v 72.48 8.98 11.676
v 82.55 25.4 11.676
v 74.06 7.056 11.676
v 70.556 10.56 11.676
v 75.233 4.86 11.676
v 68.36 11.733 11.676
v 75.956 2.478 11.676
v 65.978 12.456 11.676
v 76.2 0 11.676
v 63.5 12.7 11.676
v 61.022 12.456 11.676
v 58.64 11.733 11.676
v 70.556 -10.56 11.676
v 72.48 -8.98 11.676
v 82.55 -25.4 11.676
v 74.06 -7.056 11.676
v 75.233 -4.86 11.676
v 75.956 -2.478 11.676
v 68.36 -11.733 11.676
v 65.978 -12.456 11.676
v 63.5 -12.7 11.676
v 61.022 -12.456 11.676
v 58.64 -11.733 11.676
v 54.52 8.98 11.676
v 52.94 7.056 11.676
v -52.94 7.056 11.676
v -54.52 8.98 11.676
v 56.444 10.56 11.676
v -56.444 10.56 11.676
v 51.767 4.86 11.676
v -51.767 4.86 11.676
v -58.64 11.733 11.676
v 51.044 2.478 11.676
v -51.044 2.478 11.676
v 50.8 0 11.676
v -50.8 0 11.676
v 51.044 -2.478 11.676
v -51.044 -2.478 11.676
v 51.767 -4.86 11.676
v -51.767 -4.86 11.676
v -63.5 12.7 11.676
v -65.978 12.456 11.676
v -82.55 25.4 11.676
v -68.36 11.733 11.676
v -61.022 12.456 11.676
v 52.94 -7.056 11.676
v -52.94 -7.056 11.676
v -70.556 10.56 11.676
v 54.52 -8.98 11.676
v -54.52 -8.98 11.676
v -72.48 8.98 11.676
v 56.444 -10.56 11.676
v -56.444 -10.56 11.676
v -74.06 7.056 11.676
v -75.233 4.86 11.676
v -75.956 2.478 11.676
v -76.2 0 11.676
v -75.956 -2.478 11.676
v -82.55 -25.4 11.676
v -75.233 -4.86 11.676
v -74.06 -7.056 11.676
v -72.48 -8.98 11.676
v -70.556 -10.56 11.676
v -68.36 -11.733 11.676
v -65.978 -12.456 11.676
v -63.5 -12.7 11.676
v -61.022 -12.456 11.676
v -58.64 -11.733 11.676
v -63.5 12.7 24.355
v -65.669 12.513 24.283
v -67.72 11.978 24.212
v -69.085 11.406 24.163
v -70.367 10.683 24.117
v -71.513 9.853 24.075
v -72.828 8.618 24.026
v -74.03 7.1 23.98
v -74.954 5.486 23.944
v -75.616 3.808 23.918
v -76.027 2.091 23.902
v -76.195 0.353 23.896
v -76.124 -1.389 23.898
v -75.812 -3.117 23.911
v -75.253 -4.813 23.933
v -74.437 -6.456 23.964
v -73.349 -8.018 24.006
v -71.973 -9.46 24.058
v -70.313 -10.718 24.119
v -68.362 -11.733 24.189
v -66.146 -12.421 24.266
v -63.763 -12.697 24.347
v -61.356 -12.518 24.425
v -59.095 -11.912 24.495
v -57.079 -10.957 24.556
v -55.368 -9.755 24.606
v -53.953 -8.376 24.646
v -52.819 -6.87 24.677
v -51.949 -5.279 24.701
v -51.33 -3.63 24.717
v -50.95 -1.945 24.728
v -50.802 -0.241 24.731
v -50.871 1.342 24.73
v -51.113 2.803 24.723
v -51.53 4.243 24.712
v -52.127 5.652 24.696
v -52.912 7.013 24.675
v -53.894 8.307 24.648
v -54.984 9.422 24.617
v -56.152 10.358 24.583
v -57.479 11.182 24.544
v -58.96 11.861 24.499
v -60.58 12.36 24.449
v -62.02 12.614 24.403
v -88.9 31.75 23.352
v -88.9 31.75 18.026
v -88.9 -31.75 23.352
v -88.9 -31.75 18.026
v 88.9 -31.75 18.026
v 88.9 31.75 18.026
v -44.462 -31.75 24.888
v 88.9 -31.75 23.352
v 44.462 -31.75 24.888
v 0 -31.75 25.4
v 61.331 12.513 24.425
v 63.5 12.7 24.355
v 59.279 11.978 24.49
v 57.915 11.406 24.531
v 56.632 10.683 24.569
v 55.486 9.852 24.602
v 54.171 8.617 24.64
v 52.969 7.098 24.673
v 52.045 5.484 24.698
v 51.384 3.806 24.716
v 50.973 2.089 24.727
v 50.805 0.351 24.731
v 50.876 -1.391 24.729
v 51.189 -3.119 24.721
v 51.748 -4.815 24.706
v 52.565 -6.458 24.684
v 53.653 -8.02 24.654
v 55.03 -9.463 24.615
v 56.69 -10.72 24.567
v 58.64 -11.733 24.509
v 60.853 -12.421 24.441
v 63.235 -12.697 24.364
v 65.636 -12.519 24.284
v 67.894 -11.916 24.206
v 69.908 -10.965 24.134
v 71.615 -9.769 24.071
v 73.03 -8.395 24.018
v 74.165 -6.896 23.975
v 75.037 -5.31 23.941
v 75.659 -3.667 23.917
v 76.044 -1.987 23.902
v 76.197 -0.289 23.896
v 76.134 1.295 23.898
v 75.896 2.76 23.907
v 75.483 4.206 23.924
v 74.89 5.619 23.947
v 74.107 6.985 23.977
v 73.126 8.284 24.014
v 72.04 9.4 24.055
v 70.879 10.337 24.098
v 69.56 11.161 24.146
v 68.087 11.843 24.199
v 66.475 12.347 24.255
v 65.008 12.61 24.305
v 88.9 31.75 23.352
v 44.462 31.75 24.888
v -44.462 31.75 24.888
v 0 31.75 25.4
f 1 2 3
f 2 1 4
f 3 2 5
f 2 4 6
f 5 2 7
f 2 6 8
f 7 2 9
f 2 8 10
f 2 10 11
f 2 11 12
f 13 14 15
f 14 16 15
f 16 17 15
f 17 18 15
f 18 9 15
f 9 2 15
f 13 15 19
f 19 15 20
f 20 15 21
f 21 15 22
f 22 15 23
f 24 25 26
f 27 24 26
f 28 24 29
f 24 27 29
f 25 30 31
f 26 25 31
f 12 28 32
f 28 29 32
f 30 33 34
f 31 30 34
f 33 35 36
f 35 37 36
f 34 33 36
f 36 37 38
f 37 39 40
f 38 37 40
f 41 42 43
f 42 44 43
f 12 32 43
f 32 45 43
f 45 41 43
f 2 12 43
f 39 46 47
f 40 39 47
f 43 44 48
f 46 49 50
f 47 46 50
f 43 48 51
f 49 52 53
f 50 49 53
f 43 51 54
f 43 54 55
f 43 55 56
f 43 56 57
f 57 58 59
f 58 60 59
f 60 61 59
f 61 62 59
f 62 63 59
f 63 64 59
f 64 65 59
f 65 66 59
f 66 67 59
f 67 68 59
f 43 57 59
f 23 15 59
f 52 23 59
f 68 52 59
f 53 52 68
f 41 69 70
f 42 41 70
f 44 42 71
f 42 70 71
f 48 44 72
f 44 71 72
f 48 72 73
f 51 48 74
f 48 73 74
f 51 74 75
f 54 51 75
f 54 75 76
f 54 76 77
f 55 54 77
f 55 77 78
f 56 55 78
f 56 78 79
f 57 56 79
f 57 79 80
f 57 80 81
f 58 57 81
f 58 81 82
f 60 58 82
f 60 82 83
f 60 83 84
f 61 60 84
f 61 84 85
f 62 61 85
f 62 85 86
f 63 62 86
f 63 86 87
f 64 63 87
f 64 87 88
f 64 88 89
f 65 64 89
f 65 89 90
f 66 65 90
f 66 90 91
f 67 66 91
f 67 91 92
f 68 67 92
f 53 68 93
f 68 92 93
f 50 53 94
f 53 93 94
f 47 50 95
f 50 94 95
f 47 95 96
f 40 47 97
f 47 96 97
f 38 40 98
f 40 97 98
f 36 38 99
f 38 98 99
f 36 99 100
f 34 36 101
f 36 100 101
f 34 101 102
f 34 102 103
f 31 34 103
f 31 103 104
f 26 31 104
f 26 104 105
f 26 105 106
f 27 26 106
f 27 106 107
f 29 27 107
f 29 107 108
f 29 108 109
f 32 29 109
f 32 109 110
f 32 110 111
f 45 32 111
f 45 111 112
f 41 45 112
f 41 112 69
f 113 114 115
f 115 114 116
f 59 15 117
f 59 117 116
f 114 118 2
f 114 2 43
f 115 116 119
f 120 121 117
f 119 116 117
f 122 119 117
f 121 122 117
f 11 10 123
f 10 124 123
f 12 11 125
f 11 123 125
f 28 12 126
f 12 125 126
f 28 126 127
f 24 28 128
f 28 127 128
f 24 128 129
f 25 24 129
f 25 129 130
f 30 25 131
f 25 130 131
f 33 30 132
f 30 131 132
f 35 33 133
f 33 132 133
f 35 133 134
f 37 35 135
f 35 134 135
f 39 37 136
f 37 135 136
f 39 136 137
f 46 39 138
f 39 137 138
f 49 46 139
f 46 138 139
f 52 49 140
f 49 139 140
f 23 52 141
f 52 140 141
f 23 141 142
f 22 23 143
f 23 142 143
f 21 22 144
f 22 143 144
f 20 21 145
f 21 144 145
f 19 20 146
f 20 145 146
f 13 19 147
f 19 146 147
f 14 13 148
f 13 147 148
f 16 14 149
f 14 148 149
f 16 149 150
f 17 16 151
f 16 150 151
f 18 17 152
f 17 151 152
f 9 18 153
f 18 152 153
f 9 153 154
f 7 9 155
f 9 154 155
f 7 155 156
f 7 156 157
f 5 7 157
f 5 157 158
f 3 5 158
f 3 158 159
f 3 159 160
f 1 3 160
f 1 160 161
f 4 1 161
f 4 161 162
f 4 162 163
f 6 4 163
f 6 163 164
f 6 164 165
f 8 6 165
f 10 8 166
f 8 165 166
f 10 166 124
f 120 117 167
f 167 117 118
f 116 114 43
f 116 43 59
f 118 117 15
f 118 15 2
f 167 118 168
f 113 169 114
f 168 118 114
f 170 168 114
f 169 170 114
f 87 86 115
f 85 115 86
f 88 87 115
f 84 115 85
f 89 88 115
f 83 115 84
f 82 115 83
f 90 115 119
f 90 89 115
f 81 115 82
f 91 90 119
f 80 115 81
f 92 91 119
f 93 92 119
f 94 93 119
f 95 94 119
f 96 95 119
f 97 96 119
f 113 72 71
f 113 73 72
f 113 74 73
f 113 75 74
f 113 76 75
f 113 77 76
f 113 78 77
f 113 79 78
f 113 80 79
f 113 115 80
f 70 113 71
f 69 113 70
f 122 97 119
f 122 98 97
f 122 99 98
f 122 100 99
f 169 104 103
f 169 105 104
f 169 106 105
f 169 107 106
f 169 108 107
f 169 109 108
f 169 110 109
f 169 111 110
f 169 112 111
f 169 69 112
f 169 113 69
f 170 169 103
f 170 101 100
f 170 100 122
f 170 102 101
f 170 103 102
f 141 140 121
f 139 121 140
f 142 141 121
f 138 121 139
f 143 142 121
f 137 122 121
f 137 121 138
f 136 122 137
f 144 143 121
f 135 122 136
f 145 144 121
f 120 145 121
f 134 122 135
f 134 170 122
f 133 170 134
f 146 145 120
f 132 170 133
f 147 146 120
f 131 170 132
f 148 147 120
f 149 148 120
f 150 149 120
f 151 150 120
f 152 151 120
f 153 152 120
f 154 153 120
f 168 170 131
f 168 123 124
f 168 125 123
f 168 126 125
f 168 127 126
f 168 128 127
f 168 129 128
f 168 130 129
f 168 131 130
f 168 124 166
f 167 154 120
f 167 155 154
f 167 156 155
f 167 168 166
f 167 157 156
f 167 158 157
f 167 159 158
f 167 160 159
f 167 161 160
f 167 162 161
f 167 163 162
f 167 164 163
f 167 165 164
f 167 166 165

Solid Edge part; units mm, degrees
sketch "Sketch1" plane through (0, 0, 0) normal (0, 0, 1) x (1, 0, 0)
  line L0 (-88.9, -31.75) -> (88.9, -31.75)
  line L1 (88.9, -31.75) -> (88.9, 31.75)
  line L2 (88.9, 31.75) -> (-88.9, 31.75)
  line L3 (-88.9, 31.75) -> (-88.9, -31.75)
extrude "Protrusion1" add sketch "Sketch1" along normal blind 50.8
sketch "Sketch2" plane through (0, -31.75, 25.4) normal (0, -1, 0) x (1, 0, 0)
  arc A0 (-88.9, 23.3785) -> (88.9, 23.3785) centre (0, -1930.4) cw
extrude "ExtrudedCutout_3" cut sketch "Sketch2" against normal blind 91.9194 material side at (0, -31.75, 50.85)
sketch "Sketch3" plane through (0, -31.75, 25.4) normal (0, -1, 0) x (1, 0, 0)
  arc A0 (88.9, -2.0481) -> (-88.9, -2.0481) centre (0, -1930.4) ccw
extrude "ExtrudedCutout_6" cut sketch "Sketch3" along normal mid plane 192.7852 material side at (0, -31.75, 25.45)
sketch "Sketch4" plane through (0, 31.75, 12.7) normal (0, 1, 0) x (1, 0, 0)
  line L0 (-88.9, 1.0241) -> (88.9, 1.0241)
extrude "ExtrudedCutout_7" cut sketch "Sketch4" along normal mid plane 206.9311 material side at (0, 31.75, 11.6259)
chamfer "Chamfer_4" distance 6.35 angle 45 4 edges at (0, 31.75, 11.6759) (-88.9, 0, 11.6759) (0, -31.75, 11.6759) (88.9, 0, 11.6759)
sketch "Sketch5" plane through (0, 0, 50.8) normal (0, 0, 1) x (0, 1, 0)
  circle A0 centre (0, 63.5) radius 12.7
  circle A1 centre (0, -63.5) radius 12.7
  dimension "D1" = 25.4
  dimension "D2" = 127
  dimension "D3" = 63.5
extrude "ExtrudedCutout_8" cut sketch "Sketch5" against normal blind 84.0346
